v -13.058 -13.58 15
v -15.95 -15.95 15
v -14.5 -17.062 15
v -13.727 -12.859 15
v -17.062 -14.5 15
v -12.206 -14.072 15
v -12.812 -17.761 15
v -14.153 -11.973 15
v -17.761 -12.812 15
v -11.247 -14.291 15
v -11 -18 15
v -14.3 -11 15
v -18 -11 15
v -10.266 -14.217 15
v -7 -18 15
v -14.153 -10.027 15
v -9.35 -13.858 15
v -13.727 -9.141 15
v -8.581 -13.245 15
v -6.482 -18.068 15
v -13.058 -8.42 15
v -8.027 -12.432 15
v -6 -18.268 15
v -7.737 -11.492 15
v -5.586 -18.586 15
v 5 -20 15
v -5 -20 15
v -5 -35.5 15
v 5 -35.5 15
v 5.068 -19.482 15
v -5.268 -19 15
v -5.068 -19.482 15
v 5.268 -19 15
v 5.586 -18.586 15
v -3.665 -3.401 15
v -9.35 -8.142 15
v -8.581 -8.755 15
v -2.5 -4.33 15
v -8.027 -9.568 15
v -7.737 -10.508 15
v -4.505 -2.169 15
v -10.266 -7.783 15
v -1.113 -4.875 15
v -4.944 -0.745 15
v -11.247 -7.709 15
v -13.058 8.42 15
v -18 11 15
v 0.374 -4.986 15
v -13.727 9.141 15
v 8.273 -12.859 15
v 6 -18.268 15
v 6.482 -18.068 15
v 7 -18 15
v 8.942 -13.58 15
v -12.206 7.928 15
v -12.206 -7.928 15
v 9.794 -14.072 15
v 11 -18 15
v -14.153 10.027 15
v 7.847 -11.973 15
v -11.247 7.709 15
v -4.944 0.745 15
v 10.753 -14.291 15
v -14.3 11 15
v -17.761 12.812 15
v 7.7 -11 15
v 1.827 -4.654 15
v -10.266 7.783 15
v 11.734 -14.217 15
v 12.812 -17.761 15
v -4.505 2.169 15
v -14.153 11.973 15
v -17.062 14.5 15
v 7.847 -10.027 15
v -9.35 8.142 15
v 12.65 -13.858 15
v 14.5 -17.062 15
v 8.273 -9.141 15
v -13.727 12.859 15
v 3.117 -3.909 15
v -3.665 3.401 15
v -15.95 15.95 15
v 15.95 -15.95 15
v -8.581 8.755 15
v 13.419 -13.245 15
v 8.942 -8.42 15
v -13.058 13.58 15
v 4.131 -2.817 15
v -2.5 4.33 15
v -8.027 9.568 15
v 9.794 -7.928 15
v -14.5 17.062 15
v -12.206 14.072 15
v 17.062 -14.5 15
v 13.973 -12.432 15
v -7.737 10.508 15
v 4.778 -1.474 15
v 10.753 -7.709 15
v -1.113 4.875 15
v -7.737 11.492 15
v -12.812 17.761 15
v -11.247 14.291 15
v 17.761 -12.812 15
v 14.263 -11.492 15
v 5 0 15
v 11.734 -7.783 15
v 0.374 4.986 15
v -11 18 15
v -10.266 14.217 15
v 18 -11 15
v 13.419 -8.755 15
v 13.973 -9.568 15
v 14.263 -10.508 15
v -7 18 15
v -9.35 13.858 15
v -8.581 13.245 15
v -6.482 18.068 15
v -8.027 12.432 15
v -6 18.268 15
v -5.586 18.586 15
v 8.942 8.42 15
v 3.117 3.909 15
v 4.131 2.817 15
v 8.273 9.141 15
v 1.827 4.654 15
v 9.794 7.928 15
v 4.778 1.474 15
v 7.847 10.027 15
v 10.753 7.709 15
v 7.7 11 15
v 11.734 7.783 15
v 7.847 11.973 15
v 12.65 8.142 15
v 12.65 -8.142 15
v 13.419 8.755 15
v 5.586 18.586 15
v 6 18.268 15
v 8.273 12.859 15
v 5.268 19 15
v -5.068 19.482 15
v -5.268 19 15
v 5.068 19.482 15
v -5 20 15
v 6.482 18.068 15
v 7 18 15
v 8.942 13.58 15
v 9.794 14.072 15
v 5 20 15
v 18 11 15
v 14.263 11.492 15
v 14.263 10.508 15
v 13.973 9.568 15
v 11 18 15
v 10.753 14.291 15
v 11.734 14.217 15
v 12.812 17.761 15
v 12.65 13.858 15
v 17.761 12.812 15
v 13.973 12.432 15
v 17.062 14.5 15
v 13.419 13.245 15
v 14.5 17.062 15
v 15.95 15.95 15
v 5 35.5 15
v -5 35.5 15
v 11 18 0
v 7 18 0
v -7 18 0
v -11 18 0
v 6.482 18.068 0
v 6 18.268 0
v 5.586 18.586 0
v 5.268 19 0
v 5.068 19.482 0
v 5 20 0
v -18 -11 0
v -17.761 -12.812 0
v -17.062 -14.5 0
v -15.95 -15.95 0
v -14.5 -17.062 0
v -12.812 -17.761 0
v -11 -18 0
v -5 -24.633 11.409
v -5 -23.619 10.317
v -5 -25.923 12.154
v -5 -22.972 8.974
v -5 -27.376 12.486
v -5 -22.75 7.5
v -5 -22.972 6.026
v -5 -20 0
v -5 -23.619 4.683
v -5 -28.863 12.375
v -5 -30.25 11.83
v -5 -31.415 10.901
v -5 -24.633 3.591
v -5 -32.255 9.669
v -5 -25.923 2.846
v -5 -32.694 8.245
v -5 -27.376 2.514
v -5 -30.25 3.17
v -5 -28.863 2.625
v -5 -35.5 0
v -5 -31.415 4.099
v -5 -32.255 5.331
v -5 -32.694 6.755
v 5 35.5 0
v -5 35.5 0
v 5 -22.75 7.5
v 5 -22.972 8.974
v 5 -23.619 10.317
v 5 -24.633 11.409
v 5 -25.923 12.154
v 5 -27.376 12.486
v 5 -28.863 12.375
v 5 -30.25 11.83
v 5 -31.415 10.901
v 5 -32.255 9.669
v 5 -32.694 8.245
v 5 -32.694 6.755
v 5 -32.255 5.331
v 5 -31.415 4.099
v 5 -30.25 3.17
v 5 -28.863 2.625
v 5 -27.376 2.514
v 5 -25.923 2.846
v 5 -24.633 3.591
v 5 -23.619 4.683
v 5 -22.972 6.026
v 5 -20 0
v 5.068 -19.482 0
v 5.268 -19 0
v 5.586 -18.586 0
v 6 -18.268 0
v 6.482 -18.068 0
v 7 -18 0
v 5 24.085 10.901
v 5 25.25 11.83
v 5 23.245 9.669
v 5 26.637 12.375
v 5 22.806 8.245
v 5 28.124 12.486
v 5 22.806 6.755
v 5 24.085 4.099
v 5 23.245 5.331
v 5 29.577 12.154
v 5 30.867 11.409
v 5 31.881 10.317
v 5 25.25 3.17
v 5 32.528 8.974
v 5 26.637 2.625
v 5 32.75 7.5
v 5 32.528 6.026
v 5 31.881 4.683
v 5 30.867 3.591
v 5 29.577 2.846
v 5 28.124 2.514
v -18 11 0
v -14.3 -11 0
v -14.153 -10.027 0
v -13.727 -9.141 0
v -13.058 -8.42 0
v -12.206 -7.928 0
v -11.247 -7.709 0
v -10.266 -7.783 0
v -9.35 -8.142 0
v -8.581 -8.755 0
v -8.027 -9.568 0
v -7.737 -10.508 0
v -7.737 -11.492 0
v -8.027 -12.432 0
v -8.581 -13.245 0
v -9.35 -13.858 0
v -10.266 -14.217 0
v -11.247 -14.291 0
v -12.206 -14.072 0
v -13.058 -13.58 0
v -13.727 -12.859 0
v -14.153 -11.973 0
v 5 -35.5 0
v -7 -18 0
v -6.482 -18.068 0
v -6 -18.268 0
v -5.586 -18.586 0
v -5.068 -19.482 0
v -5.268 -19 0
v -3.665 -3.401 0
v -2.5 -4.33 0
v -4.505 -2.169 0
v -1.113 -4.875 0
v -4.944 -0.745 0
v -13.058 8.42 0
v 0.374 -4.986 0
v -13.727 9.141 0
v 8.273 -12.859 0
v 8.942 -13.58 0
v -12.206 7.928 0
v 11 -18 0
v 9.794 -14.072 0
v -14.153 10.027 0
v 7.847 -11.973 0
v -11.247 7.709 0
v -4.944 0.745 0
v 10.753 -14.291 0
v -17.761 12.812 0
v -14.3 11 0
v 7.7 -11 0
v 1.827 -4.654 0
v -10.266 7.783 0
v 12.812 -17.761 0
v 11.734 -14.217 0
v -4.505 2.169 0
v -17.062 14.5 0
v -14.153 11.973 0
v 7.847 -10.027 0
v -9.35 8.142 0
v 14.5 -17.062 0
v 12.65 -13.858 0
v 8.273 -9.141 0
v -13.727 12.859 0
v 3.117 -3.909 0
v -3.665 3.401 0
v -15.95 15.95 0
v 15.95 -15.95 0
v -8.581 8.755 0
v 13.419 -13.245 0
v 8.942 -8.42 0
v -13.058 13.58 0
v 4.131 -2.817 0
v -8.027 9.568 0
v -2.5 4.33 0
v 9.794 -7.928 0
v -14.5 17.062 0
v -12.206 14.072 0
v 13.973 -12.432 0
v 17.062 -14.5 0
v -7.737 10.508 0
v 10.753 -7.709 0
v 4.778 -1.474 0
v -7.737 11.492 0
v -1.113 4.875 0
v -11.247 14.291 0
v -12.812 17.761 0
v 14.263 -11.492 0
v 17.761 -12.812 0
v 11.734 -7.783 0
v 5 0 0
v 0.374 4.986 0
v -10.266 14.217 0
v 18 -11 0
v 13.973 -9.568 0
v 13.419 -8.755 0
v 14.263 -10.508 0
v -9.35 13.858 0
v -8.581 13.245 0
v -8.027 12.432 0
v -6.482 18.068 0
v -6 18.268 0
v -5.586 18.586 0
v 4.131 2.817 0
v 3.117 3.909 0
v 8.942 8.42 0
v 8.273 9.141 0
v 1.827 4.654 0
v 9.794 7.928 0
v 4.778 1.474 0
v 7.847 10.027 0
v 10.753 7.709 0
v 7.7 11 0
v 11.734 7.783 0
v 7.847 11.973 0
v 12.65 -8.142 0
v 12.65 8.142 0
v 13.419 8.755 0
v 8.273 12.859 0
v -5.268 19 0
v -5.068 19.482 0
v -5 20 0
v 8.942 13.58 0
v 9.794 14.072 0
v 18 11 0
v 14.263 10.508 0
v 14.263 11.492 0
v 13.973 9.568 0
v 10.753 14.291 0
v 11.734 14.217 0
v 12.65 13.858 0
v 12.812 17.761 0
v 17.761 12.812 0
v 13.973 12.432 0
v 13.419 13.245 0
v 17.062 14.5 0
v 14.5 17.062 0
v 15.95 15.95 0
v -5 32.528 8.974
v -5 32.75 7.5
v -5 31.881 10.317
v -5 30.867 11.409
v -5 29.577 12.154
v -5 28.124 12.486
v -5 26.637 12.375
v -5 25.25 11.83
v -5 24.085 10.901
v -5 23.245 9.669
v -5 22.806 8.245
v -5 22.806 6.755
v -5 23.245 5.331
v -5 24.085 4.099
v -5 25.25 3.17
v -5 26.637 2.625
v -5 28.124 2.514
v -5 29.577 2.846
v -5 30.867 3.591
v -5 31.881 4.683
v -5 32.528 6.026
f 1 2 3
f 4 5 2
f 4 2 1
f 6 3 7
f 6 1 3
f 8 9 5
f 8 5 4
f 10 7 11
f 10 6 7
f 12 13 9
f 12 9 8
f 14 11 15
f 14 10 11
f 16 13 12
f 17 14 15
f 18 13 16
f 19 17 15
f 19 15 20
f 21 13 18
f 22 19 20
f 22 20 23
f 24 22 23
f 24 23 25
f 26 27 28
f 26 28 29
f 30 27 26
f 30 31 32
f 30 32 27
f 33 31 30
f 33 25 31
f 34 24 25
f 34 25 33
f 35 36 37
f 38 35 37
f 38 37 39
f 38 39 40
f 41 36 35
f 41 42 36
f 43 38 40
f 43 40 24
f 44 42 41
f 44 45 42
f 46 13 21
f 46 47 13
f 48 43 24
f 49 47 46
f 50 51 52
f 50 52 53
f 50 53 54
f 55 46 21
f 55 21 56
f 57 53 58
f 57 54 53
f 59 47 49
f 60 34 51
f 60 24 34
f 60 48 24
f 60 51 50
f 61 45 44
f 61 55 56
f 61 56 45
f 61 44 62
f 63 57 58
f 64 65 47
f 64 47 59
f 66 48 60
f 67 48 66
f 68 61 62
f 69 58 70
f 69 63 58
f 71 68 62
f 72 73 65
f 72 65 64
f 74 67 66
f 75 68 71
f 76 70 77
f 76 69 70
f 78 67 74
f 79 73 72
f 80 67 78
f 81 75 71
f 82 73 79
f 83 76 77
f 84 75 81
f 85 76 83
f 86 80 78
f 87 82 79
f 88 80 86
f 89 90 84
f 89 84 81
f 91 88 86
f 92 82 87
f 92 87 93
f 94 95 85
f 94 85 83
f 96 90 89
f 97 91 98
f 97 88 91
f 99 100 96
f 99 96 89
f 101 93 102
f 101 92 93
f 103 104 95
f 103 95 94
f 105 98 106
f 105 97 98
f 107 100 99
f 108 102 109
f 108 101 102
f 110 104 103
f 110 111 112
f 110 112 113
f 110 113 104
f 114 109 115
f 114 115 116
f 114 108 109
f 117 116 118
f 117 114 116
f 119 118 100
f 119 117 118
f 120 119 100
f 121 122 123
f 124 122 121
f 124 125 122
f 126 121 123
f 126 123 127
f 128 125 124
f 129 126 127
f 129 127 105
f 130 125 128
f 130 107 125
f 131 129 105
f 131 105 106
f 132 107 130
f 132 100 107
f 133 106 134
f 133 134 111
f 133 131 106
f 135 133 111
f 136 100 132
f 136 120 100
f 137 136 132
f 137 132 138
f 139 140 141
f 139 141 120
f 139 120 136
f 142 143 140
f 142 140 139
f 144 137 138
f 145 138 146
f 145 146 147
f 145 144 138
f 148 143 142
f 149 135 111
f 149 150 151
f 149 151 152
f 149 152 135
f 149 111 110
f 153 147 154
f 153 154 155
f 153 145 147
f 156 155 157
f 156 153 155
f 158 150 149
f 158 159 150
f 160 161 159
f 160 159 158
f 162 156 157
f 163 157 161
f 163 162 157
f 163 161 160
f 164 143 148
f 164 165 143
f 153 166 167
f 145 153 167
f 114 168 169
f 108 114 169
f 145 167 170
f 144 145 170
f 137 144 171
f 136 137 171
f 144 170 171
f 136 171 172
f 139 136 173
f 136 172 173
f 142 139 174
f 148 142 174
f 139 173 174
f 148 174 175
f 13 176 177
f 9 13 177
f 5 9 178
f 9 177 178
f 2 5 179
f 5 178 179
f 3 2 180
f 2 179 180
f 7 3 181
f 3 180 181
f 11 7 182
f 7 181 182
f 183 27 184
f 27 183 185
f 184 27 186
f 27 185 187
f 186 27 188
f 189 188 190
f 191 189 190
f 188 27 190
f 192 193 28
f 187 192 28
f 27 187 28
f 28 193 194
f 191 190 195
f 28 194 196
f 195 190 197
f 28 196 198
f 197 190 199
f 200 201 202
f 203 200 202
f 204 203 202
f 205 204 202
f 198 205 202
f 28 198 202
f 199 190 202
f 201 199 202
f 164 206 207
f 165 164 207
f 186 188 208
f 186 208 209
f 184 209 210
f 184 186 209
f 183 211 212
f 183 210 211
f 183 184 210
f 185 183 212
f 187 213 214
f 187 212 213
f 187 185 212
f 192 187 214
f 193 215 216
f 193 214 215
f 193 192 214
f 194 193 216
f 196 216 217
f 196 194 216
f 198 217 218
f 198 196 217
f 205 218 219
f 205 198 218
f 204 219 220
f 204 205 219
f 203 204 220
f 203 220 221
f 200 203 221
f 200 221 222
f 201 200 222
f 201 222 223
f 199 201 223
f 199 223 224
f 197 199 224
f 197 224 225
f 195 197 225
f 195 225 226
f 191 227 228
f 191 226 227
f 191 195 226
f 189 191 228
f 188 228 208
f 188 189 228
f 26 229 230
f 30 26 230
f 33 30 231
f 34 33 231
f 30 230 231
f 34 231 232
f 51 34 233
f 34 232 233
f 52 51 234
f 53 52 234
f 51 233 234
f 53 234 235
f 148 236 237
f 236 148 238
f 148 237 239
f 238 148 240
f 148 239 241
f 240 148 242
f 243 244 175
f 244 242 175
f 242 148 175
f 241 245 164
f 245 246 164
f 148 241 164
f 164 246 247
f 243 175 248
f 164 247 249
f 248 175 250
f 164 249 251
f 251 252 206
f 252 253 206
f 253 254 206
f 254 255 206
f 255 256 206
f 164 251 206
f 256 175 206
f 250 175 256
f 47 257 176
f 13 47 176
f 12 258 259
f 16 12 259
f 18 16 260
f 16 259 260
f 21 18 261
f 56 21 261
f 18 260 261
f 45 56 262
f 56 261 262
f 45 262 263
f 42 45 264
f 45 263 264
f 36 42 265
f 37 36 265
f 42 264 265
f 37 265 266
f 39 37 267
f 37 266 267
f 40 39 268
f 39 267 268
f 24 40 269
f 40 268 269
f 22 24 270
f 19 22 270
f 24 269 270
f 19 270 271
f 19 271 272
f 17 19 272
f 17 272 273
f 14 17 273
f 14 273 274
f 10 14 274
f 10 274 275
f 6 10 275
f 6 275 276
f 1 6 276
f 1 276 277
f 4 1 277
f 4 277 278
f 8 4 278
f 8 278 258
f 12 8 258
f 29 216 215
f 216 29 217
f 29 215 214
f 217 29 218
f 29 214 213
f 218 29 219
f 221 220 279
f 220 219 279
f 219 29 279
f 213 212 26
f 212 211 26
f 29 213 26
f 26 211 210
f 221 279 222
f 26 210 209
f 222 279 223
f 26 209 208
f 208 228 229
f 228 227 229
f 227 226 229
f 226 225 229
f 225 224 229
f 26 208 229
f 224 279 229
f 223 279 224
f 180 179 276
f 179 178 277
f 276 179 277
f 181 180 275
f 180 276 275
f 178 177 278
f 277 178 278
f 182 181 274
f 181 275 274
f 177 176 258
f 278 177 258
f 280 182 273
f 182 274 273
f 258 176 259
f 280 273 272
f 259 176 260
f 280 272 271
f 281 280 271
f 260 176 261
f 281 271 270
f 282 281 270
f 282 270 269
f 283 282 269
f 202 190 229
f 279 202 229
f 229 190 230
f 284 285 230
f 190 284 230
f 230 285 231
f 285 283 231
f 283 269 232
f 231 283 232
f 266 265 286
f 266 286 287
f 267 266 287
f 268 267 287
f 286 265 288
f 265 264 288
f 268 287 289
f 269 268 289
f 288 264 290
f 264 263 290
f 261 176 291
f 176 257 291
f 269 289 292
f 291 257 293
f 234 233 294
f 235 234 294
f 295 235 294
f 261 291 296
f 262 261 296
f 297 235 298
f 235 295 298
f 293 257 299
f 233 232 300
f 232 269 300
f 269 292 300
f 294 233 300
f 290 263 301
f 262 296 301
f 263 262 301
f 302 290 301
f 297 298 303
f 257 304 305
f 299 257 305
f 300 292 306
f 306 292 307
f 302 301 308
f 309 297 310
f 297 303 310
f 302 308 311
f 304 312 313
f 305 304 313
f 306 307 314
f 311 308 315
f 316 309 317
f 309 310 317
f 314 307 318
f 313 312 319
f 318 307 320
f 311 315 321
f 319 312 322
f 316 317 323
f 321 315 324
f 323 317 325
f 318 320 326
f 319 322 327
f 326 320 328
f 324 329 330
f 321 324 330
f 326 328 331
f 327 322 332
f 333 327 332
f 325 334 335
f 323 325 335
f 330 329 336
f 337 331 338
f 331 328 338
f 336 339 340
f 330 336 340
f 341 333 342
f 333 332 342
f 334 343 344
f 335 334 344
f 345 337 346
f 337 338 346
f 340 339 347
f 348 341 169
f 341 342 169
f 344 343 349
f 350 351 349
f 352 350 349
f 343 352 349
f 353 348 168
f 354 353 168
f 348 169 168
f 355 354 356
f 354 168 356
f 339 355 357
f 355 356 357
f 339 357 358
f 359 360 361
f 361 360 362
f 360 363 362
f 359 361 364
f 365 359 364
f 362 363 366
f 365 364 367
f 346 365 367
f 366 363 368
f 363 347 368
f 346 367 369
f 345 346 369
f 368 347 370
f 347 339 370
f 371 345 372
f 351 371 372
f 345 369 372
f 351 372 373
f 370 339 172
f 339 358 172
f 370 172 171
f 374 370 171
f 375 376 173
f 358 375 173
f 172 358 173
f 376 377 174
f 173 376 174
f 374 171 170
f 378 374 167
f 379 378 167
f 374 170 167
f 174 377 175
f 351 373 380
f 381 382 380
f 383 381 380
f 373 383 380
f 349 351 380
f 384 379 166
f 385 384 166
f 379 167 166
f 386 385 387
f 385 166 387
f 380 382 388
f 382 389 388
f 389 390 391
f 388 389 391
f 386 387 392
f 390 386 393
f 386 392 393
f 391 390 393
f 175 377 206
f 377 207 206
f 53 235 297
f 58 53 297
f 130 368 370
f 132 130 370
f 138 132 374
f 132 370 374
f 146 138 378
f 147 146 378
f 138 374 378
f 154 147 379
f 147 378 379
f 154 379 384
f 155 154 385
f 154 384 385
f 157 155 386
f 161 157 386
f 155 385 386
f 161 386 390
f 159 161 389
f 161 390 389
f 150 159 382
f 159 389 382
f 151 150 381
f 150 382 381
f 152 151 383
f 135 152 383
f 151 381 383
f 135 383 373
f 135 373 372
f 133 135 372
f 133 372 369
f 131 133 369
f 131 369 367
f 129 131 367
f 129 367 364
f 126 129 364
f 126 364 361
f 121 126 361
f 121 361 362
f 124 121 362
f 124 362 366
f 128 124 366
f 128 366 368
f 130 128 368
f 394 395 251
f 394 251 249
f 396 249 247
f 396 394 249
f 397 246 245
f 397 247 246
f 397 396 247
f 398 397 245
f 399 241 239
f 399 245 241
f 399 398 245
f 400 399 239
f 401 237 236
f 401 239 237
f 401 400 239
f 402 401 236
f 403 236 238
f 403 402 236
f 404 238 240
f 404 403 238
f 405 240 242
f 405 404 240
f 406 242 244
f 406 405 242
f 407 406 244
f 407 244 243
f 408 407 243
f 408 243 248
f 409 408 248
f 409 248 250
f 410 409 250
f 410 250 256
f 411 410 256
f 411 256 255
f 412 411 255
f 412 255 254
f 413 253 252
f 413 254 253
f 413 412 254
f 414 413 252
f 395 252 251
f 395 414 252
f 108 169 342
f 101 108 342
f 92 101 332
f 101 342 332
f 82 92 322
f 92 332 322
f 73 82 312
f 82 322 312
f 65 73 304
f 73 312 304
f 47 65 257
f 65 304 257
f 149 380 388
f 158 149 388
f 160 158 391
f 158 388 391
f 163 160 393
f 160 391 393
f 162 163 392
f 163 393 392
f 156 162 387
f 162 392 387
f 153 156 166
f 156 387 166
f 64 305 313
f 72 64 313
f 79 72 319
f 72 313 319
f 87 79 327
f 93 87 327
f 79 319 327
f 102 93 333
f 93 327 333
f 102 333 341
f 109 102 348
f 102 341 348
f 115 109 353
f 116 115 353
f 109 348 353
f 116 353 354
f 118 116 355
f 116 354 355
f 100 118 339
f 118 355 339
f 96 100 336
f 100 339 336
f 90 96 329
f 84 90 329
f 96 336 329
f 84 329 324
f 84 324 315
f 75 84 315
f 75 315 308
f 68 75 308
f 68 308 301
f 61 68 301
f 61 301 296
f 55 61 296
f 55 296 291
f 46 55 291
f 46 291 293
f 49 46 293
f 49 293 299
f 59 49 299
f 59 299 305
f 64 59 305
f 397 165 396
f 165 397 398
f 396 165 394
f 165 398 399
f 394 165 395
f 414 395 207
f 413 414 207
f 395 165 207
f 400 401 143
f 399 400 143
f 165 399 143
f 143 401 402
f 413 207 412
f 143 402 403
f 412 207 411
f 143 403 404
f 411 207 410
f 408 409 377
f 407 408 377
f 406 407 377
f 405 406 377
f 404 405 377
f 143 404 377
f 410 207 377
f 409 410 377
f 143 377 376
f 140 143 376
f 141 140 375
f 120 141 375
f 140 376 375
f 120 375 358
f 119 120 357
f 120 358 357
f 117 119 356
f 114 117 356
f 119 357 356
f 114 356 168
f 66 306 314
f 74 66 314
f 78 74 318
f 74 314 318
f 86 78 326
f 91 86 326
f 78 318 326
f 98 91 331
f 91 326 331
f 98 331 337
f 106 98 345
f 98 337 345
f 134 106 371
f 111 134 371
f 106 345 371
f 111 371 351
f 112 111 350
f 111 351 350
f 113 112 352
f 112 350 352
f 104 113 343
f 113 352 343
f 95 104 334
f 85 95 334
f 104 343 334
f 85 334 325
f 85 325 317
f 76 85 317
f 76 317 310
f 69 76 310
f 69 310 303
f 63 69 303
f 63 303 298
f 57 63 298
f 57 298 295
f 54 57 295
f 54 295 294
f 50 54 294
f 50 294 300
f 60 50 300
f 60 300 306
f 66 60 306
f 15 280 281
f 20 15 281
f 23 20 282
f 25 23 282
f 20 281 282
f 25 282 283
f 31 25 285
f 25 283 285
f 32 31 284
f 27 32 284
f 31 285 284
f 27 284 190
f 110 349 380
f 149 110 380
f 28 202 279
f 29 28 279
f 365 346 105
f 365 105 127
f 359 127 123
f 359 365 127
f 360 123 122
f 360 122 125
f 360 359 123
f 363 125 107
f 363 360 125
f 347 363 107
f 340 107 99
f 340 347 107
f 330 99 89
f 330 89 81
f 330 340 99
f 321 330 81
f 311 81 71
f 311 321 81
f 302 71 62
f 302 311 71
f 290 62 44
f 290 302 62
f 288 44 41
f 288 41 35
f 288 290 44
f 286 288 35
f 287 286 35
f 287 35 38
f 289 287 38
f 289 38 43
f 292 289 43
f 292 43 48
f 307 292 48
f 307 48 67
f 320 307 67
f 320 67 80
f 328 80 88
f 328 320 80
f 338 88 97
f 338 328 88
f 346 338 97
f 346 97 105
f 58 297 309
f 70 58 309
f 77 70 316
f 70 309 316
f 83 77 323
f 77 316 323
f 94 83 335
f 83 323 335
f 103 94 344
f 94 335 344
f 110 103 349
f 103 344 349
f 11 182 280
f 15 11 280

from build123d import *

# Parameters (mm, degrees)
ESBO_O1_R                  = 5
RESSALTO_EXTRUS_O1_DEPTH   = 15
FURO_COM_FOLGA_DE_M61_D    = 6.6
CORTE_EXTRUS_O1_DEPTH      = 43.535279475
CORTE_EXTRUS_O1_DEPTH_BACK = 43.535279475
ESBO_O4_R                  = 5


with BuildPart() as part:
    # Esboço1 → Ressalto-extrusão1 (new body)
    with BuildSketch(Plane.XY):
        with BuildLine():
            Line((-5, -20), (-5, -35.5))
            Line((-5, -35.5), (5, -35.5))
            Line((5, -35.5), (5, -20))
            ThreePointArc((5, -20), (5.585786438, -18.585786438), (7, -18))
            Line((7, -18), (11, -18))
            ThreePointArc((11, -18), (15.949747468, -15.949747468), (18, -11))
            Line((18, -11), (18, 11))
            ThreePointArc((18, 11), (15.949747468, 15.949747468), (11, 18))
            Line((11, 18), (7, 18))
            ThreePointArc((7, 18), (5.585786438, 18.585786438), (5, 20))
            Line((5, 20), (5, 35.5))
            Line((5, 35.5), (-5, 35.5))
            Line((-5, 35.5), (-5, 20))
            ThreePointArc((-5, 20), (-5.585786438, 18.585786438), (-7, 18))
            Line((-7, 18), (-11, 18))
            ThreePointArc((-11, 18), (-15.949747468, 15.949747468), (-18, 11))
            Line((-18, 11), (-18, -11))
            ThreePointArc((-18, -11), (-15.949747468, -15.949747468), (-11, -18))
            Line((-11, -18), (-7, -18))
            ThreePointArc((-7, -18), (-5.585786438, -18.585786438), (-5, -20))
        make_face()
        Circle(ESBO_O1_R, mode=Mode.SUBTRACT)
    extrude(amount=RESSALTO_EXTRUS_O1_DEPTH)

    # Furo com folga de M61 (through all)
    with Locations(Plane.XY.offset(15)):
        with Locations((11, 11), (-11, 11), (-11, -11), (11, -11)):
            Hole(FURO_COM_FOLGA_DE_M61_D / 2)

    # Esboço4 → Corte-extrusão1 (cut, two sides: drawn at the far end of the back side and taken through both)
    with BuildSketch(Plane(origin=(0, 0, 0), x_dir=(0, 0, -1), z_dir=(1, 0, 0)).offset(-CORTE_EXTRUS_O1_DEPTH_BACK)):
        with Locations(Location((-7.5, 27.75, 0), (0, 0, 90))):
            Circle(ESBO_O4_R)
        with Locations(Location((-7.5, -27.75, 0), (0, 0, 90))):
            Circle(ESBO_O4_R)
    extrude(amount=CORTE_EXTRUS_O1_DEPTH + CORTE_EXTRUS_O1_DEPTH_BACK, mode=Mode.SUBTRACT)


solid = part.part
